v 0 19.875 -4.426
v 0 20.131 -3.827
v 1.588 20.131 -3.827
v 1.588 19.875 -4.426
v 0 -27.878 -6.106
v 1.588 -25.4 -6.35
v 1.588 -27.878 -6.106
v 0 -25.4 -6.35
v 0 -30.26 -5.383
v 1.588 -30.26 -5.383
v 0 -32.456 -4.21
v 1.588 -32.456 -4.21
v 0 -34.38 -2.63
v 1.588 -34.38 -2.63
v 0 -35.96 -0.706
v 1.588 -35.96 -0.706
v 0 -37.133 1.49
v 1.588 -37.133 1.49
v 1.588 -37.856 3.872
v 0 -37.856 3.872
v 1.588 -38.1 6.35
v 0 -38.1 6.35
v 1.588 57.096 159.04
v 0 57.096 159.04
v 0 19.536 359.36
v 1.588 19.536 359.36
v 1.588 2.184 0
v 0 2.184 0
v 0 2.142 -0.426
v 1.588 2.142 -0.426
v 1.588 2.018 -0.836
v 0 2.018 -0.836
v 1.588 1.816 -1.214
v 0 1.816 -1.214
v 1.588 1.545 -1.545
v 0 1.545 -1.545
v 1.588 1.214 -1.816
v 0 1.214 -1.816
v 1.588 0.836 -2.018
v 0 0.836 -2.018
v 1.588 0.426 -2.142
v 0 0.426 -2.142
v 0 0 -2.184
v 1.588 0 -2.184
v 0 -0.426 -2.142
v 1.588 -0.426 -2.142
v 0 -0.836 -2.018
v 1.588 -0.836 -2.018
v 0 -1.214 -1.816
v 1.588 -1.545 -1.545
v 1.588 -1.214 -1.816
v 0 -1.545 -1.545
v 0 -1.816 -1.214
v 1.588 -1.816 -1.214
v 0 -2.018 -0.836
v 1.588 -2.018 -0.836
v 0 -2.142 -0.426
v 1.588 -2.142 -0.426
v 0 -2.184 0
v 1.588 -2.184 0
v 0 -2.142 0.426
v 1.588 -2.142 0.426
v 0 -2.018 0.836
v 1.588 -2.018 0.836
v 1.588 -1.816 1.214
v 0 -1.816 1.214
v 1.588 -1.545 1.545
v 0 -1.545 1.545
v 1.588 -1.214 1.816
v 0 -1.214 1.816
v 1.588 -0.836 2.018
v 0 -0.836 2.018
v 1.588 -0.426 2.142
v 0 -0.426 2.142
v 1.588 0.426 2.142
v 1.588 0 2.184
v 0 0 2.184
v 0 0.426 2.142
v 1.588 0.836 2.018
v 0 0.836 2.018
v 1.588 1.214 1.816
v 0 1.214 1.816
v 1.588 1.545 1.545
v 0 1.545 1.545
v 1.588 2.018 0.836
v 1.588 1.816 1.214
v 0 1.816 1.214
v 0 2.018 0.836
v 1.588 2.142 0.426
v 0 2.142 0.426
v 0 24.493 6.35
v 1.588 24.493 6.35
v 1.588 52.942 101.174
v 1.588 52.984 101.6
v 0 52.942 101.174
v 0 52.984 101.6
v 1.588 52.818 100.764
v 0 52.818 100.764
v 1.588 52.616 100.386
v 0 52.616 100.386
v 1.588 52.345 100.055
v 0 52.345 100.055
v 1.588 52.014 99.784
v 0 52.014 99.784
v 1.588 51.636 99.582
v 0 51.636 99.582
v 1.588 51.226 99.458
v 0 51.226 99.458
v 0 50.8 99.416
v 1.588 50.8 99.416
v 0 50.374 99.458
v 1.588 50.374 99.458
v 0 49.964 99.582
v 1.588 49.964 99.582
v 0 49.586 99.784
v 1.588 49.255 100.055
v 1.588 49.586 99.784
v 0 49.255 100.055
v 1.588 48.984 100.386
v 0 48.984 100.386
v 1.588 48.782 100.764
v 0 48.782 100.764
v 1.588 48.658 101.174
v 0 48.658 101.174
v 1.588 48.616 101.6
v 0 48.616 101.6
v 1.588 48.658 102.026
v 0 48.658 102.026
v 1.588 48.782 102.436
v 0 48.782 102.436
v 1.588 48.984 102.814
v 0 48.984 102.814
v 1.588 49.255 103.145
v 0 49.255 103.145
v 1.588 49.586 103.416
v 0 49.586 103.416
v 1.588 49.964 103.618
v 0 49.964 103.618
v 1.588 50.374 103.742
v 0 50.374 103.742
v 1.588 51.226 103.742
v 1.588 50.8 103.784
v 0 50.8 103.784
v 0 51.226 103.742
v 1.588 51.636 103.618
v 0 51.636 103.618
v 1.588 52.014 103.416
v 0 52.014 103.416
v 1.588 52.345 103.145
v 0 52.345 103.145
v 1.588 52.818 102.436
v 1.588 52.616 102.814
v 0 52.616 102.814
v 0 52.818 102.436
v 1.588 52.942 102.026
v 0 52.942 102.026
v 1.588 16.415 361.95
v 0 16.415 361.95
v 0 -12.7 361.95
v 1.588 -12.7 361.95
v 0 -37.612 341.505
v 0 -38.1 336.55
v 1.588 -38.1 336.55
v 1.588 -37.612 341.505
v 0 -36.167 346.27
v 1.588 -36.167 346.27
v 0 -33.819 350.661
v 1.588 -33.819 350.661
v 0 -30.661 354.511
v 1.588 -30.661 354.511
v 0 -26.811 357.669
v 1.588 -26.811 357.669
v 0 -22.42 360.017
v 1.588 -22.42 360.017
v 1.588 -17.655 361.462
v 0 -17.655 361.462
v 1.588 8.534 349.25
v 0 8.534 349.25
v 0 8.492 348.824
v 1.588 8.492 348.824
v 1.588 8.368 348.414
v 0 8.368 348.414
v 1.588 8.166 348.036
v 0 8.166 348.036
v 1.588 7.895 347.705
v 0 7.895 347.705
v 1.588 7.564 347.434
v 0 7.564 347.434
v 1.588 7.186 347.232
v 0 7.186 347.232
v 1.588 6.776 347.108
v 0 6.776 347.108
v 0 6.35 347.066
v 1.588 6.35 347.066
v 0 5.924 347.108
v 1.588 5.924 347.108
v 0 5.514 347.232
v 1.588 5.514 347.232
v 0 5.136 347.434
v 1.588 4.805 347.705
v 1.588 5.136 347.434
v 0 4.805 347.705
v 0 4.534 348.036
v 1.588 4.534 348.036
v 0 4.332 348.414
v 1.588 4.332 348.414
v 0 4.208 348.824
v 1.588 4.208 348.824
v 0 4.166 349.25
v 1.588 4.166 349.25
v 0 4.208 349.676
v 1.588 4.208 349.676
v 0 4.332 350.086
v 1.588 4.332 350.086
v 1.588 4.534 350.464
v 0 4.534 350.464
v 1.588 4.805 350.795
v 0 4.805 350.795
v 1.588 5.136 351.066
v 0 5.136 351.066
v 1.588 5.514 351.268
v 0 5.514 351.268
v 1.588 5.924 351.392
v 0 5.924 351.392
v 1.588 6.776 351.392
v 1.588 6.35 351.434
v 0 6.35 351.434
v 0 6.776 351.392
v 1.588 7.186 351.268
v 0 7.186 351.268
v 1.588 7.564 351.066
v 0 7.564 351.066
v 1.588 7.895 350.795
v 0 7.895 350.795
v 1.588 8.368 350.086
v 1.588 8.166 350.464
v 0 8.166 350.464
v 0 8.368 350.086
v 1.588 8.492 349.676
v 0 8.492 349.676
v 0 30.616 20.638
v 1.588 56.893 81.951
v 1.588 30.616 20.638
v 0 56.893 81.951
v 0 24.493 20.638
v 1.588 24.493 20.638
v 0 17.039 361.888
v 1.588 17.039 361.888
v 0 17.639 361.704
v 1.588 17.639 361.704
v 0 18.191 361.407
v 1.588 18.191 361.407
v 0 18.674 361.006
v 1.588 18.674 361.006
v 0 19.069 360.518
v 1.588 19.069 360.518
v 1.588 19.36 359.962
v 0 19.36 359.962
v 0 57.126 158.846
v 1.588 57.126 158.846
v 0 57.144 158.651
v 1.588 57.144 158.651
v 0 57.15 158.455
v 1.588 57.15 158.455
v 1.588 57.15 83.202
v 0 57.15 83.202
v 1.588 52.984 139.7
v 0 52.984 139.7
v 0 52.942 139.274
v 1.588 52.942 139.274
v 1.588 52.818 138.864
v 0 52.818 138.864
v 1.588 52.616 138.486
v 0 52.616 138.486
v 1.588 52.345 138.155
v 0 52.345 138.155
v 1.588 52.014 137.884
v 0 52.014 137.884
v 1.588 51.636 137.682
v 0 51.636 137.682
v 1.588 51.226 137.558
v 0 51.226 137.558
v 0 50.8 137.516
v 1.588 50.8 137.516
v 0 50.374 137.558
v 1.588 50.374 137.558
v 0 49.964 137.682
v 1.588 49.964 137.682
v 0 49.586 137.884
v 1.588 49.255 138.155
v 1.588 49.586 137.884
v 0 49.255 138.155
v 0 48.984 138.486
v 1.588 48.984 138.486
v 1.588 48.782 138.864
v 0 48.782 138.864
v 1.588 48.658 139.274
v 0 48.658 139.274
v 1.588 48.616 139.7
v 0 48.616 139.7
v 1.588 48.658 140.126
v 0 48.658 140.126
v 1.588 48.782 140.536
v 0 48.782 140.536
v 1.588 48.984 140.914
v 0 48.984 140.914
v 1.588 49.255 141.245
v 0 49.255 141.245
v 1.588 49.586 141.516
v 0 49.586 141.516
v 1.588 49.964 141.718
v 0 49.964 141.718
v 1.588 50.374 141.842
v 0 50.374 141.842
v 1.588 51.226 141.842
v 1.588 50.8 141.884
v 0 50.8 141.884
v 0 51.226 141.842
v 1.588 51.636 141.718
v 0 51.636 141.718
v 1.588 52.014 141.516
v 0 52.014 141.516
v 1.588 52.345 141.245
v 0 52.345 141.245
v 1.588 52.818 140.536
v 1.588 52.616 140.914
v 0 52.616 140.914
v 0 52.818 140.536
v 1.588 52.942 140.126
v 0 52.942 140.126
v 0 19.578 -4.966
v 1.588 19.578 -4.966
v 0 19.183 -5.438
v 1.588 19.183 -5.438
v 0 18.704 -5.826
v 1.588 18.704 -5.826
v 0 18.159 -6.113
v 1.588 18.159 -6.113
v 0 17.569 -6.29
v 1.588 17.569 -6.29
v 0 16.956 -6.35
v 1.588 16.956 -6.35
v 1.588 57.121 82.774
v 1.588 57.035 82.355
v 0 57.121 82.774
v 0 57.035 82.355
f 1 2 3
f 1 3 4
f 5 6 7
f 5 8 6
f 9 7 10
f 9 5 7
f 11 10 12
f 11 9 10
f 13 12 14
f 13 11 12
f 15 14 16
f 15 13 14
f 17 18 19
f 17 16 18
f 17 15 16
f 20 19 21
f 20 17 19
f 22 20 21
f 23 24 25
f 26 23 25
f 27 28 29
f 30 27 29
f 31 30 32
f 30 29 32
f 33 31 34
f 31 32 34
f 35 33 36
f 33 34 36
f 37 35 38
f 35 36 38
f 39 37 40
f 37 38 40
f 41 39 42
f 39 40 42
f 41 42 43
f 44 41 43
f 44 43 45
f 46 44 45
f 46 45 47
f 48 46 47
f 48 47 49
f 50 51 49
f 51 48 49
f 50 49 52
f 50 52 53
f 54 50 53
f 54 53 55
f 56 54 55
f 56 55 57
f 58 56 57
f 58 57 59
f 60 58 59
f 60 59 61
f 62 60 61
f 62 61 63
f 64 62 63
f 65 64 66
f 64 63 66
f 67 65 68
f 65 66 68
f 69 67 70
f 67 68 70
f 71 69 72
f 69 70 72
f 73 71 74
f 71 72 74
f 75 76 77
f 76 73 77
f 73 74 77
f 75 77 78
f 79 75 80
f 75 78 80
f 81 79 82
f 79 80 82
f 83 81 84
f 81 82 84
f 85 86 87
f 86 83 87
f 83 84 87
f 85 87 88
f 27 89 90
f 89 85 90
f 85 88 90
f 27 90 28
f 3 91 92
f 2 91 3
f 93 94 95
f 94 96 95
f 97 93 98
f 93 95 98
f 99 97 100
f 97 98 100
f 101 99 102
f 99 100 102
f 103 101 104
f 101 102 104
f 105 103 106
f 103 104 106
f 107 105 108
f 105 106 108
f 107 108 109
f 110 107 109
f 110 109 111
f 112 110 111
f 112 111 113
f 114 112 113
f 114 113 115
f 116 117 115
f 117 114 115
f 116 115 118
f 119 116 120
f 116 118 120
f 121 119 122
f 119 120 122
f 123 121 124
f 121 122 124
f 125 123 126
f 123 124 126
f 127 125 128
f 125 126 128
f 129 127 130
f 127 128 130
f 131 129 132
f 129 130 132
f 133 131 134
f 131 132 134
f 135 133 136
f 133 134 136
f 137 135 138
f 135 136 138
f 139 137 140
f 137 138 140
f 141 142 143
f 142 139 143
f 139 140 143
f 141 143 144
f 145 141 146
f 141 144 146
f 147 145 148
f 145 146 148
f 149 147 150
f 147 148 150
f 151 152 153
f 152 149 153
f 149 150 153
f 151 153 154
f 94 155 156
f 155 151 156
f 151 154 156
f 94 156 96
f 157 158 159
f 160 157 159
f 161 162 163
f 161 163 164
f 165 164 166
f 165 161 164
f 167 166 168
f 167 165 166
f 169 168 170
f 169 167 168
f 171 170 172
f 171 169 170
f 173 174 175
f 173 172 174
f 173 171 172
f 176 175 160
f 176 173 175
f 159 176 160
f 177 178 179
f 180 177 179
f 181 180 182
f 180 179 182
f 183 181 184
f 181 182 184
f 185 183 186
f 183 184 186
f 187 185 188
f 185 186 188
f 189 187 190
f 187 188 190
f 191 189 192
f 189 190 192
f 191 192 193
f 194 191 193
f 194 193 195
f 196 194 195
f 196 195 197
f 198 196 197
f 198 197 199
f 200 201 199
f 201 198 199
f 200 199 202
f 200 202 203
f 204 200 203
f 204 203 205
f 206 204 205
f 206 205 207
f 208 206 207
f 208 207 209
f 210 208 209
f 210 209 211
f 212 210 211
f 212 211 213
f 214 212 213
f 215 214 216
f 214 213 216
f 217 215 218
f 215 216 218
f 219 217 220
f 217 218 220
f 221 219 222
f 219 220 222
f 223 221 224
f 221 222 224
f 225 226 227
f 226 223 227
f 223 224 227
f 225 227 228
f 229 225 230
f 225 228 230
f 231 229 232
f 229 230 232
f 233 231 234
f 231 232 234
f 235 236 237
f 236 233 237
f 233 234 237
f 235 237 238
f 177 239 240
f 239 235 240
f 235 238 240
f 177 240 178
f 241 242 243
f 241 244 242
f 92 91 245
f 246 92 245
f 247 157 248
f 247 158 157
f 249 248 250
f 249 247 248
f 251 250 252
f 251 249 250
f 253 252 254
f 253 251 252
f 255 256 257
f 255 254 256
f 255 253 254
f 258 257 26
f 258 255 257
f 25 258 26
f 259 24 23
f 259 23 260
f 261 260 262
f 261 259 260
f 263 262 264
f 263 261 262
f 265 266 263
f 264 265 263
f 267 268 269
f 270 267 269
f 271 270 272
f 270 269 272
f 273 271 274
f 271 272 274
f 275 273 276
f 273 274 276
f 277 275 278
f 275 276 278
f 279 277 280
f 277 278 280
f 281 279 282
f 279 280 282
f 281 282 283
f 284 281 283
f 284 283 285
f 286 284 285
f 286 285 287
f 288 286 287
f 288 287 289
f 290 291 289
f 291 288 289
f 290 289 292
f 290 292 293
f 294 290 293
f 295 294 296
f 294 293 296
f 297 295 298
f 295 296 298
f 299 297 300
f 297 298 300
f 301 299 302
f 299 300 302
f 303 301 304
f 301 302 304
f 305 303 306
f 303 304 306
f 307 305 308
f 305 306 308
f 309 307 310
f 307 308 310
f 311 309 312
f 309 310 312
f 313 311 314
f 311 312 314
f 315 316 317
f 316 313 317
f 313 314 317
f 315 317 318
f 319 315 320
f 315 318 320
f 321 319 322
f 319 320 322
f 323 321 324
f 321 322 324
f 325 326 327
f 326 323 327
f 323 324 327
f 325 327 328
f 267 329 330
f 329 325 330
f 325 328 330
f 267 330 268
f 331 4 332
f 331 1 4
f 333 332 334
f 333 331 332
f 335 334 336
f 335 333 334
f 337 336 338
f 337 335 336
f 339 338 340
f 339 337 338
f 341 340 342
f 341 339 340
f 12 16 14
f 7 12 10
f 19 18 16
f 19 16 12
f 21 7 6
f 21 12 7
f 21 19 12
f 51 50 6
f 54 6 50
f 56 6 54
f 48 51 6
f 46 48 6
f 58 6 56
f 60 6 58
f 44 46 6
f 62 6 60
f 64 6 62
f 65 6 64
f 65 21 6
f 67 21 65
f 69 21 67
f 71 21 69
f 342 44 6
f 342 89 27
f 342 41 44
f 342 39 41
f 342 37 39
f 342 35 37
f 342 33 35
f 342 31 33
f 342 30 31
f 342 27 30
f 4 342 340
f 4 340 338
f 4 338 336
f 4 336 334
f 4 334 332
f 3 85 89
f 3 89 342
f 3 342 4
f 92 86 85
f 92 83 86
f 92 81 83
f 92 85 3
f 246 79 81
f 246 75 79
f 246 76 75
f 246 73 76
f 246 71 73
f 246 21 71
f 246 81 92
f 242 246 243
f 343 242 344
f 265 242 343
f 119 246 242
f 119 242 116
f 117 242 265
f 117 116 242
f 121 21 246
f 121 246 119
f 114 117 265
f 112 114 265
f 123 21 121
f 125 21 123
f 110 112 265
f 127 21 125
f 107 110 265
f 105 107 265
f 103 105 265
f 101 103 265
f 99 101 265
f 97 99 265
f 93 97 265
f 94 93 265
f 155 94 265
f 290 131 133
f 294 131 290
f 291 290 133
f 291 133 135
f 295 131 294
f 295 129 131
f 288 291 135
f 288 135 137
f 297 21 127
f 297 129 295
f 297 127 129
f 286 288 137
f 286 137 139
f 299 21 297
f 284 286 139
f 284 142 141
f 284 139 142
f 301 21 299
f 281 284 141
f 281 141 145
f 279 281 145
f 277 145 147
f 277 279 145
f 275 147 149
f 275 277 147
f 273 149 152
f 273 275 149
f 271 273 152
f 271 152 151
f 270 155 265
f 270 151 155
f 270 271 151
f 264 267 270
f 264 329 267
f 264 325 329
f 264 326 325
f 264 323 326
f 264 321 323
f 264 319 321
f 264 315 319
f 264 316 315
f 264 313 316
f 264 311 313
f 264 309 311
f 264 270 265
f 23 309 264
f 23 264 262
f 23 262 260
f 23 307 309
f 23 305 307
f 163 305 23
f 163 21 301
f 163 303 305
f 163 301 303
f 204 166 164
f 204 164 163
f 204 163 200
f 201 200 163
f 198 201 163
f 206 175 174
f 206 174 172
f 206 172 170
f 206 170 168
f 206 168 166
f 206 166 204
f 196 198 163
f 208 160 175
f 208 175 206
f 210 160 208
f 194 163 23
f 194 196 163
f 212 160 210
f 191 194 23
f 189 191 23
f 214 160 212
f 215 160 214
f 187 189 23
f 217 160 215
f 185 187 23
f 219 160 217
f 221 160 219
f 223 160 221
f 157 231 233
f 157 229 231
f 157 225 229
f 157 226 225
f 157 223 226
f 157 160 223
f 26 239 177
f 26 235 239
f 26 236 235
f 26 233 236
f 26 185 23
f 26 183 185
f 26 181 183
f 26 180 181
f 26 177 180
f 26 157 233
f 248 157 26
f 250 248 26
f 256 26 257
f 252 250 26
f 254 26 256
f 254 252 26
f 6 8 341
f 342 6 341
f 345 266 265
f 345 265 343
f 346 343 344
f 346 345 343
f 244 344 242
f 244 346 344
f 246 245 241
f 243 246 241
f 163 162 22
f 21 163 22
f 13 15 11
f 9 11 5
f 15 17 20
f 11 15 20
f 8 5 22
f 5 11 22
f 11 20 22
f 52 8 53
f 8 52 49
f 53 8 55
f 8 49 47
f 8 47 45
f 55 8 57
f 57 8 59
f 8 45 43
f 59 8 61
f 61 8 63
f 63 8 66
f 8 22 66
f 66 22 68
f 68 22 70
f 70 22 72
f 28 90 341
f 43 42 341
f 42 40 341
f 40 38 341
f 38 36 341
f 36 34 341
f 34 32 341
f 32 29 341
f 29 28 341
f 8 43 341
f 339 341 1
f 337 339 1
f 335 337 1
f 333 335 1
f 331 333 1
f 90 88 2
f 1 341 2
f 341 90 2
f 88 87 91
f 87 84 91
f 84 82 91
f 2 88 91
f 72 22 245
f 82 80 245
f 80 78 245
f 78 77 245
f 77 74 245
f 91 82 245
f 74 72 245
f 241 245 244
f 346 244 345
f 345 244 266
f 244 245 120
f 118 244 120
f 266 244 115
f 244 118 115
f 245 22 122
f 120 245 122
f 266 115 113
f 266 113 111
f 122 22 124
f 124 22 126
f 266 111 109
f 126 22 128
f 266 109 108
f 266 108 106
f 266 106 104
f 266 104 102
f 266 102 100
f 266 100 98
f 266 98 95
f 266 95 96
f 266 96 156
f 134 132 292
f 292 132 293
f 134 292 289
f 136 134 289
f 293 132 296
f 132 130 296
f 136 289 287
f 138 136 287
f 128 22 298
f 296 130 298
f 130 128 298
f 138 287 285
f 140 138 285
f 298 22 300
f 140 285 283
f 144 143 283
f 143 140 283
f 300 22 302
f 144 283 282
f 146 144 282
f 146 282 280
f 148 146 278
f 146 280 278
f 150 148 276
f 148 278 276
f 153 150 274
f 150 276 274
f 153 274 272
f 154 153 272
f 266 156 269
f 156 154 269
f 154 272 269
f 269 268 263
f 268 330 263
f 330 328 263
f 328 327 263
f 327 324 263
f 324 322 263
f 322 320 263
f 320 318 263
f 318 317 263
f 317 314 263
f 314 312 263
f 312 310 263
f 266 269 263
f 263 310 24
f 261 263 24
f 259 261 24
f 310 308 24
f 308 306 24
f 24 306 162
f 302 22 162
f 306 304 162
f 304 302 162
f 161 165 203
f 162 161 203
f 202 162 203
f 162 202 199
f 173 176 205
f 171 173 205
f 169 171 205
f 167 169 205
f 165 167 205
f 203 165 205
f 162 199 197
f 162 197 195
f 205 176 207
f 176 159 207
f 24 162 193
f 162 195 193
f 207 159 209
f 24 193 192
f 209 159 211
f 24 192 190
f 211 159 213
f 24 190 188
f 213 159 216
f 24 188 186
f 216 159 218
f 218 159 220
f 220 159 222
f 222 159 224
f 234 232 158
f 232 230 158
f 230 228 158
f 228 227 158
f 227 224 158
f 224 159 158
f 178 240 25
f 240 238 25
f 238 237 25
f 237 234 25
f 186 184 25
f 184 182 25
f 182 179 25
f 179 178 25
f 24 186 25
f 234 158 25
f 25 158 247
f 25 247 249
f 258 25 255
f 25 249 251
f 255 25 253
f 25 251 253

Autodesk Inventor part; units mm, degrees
ref_plane "YZ Plane" through (0, 0, 0) normal (1, 0, 0) x (0, 1, 0)
ref_plane "XZ Plane" through (0, 0, 0) normal (0, 1, 0) x (-1, 0, 0)
ref_plane "XY Plane" through (0, 0, 0) normal (0, 0, 1) x (1, 0, 0)
sketch "main" plane through (0, 0, 0) normal (0, 0, 1) x (1, 0, 0)
  circle A0 centre (51.9329, 240.4167) radius 2.1844
  line L0 (60.6642, 253.1167) -> (43.2017, 253.1167)
  arc A1 (32.8829, 253.1167) -> (7.4829, 227.7167) centre (32.8829, 227.7167) ccw
  line L1 (39.2329, 253.1167) -> (32.8829, 253.1167)
  line L2 (39.2329, 249.9417) -> (39.2329, 253.1167)
  line L3 (39.2329, 253.1167) -> (42.4079, 253.1167)
  line L4 (42.4079, 253.1167) -> (43.2017, 253.1167)
  arc A2 (65.1185, 250.5268) -> (61.9979, 253.1167) centre (61.9979, 249.9417) ccw
  line L5 (61.9979, 253.1167) -> (60.6642, 253.1167)
  line L6 (42.4079, -115.1833) -> (62.5393, -115.1833)
  arc A3 (7.4829, -102.4833) -> (20.1829, -115.1833) centre (20.1829, -102.4833) ccw
  line L7 (20.1829, -115.1833) -> (42.4079, -115.1833)
  arc A4 (62.5393, -115.1833) -> (65.4576, -113.259) centre (62.5393, -112.0083) ccw
  line L8 (39.2329, 249.9417) -> (39.2329, -115.1833)
  line L9 (102.7329, -25.6316) -> (102.7329, 49.6216)
  line L10 (102.6786, 50.2068) -> (65.1185, 250.5268)
  line L11 (7.4829, 227.7167) -> (7.4829, -102.4833)
  arc A5 (102.7329, 49.6216) -> (102.6786, 50.2068) centre (99.5579, 49.6216) ccw
  circle A6 centre (96.3829, 30.8667) radius 2.1844
  circle A7 centre (96.3829, -7.2333) radius 2.1844
  arc A8 (102.4762, -26.8823) -> (102.7329, -25.6316) centre (99.5579, -25.6316) ccw
  circle A9 centre (45.5829, -108.8333) radius 2.1844
  line L12 (65.7143, -112.66) -> (65.4576, -113.259)
  line L13 (70.0758, -102.4833) -> (70.0758, -92.9583)
  line L14 (102.4762, -26.8823) -> (76.199, -88.1958)
  line L15 (70.0758, -102.4833) -> (65.7143, -112.66)
  line L16 (70.0758, -102.4833) -> (70.0758, -89.7833)
  line L17 (70.0758, -102.4833) -> (70.0758, -88.1958)
  line L18 (70.0758, -88.1958) -> (76.199, -88.1958)
  point P0 (57.0821, 72.2396)
  point P1 (7.4829, 253.1167)
  point P2 (64.6329, -115.1833)
  point P3 (102.7329, -26.2833)
  dimension "d0" = 25.4
  dimension "d1" = 3.175
  dimension "d2" = 3.175
  dimension "d3" = 3.175
  dimension "d4" = 31.75
  dimension "d5" = 90
  dimension "d6" = 25.4
  dimension "d7" = 12.7
  dimension "d16" = 12.7
  dimension "d17" = 14.2875
sketch "Sketch1" plane through (0, 0, 0) normal (1, 0, 0) x (0, 1, 0)
  circle A0 centre (6.35, 349.25) radius 2.1844
  line L0 (15.0812, 361.95) -> (-2.3813, 361.95)
  arc A1 (-12.7, 361.95) -> (-38.1, 336.55) centre (-12.7, 336.55) ccw
  line L1 (-6.35, 361.95) -> (-12.7, 361.95)
  line L2 (-6.35, 358.775) -> (-6.35, 361.95)
  line L3 (-6.35, 361.95) -> (-3.175, 361.95)
  line L4 (-3.175, 361.95) -> (-2.3813, 361.95)
  arc A2 (19.5356, 359.3601) -> (16.415, 361.95) centre (16.415, 358.775) ccw
  line L5 (16.415, 361.95) -> (15.0812, 361.95)
  line L6 (-3.175, -6.35) -> (16.9564, -6.35)
  arc A3 (-38.1, 6.35) -> (-25.4, -6.35) centre (-25.4, 6.35) ccw
  line L7 (-25.4, -6.35) -> (-3.175, -6.35)
  arc A4 (16.9564, -6.35) -> (19.8747, -4.4257) centre (16.9564, -3.175) ccw
  line L8 (-6.35, 358.775) -> (-6.35, -6.35)
  line L9 (57.15, 83.2017) -> (57.15, 158.4549)
  line L10 (57.0956, 159.04) -> (19.5356, 359.3601)
  line L11 (-38.1, 336.55) -> (-38.1, 6.35)
  arc A5 (57.15, 158.4549) -> (57.0956, 159.04) centre (53.975, 158.4549) ccw
  circle A6 centre (50.8, 139.7) radius 2.1844
  circle A7 centre (50.8, 101.6) radius 2.1844
  arc A8 (56.8933, 81.951) -> (57.15, 83.2017) centre (53.975, 83.2017) ccw
  circle A9 centre (0, 0) radius 2.1844
  line L12 (20.1314, -3.8267) -> (19.8747, -4.4257)
  line L13 (24.4929, 6.35) -> (24.4929, 15.875)
  line L14 (56.8933, 81.951) -> (30.6161, 20.6375)
  line L15 (24.4929, 6.35) -> (20.1314, -3.8267)
  line L16 (24.4929, 6.35) -> (24.4929, 19.05)
  line L17 (24.4929, 6.35) -> (24.4929, 20.6375)
  line L18 (24.4929, 20.6375) -> (30.6161, 20.6375)
  point P0 (24.4929, 15.875)
  point P1 (24.4929, 19.05)
extrude "Extrusion1" add sketch "Sketch1" along normal blind 1.5875
feature "Bend Part1" [suppressed]
equation "\"BendRadius\" = Thickness"
equation "\"BendReliefWidth\" = Thickness"
equation "\"BendReliefDepth\" = 0.5 * Thickness"
equation "\"CornerReliefSize\" = 4 * Thickness"
equation "\"MinimumRemnant\" = 2 * Thickness"
equation "\"TransitionRadius\" = BendRadius"
equation "\"JacobiRadiusSize\" = BendRadius"
equation "\"GapSize\" = Thickness"
equation "\"Thickness\" = 1.5875"
properties part number "side_panel" material "Acetal Resin, White"
